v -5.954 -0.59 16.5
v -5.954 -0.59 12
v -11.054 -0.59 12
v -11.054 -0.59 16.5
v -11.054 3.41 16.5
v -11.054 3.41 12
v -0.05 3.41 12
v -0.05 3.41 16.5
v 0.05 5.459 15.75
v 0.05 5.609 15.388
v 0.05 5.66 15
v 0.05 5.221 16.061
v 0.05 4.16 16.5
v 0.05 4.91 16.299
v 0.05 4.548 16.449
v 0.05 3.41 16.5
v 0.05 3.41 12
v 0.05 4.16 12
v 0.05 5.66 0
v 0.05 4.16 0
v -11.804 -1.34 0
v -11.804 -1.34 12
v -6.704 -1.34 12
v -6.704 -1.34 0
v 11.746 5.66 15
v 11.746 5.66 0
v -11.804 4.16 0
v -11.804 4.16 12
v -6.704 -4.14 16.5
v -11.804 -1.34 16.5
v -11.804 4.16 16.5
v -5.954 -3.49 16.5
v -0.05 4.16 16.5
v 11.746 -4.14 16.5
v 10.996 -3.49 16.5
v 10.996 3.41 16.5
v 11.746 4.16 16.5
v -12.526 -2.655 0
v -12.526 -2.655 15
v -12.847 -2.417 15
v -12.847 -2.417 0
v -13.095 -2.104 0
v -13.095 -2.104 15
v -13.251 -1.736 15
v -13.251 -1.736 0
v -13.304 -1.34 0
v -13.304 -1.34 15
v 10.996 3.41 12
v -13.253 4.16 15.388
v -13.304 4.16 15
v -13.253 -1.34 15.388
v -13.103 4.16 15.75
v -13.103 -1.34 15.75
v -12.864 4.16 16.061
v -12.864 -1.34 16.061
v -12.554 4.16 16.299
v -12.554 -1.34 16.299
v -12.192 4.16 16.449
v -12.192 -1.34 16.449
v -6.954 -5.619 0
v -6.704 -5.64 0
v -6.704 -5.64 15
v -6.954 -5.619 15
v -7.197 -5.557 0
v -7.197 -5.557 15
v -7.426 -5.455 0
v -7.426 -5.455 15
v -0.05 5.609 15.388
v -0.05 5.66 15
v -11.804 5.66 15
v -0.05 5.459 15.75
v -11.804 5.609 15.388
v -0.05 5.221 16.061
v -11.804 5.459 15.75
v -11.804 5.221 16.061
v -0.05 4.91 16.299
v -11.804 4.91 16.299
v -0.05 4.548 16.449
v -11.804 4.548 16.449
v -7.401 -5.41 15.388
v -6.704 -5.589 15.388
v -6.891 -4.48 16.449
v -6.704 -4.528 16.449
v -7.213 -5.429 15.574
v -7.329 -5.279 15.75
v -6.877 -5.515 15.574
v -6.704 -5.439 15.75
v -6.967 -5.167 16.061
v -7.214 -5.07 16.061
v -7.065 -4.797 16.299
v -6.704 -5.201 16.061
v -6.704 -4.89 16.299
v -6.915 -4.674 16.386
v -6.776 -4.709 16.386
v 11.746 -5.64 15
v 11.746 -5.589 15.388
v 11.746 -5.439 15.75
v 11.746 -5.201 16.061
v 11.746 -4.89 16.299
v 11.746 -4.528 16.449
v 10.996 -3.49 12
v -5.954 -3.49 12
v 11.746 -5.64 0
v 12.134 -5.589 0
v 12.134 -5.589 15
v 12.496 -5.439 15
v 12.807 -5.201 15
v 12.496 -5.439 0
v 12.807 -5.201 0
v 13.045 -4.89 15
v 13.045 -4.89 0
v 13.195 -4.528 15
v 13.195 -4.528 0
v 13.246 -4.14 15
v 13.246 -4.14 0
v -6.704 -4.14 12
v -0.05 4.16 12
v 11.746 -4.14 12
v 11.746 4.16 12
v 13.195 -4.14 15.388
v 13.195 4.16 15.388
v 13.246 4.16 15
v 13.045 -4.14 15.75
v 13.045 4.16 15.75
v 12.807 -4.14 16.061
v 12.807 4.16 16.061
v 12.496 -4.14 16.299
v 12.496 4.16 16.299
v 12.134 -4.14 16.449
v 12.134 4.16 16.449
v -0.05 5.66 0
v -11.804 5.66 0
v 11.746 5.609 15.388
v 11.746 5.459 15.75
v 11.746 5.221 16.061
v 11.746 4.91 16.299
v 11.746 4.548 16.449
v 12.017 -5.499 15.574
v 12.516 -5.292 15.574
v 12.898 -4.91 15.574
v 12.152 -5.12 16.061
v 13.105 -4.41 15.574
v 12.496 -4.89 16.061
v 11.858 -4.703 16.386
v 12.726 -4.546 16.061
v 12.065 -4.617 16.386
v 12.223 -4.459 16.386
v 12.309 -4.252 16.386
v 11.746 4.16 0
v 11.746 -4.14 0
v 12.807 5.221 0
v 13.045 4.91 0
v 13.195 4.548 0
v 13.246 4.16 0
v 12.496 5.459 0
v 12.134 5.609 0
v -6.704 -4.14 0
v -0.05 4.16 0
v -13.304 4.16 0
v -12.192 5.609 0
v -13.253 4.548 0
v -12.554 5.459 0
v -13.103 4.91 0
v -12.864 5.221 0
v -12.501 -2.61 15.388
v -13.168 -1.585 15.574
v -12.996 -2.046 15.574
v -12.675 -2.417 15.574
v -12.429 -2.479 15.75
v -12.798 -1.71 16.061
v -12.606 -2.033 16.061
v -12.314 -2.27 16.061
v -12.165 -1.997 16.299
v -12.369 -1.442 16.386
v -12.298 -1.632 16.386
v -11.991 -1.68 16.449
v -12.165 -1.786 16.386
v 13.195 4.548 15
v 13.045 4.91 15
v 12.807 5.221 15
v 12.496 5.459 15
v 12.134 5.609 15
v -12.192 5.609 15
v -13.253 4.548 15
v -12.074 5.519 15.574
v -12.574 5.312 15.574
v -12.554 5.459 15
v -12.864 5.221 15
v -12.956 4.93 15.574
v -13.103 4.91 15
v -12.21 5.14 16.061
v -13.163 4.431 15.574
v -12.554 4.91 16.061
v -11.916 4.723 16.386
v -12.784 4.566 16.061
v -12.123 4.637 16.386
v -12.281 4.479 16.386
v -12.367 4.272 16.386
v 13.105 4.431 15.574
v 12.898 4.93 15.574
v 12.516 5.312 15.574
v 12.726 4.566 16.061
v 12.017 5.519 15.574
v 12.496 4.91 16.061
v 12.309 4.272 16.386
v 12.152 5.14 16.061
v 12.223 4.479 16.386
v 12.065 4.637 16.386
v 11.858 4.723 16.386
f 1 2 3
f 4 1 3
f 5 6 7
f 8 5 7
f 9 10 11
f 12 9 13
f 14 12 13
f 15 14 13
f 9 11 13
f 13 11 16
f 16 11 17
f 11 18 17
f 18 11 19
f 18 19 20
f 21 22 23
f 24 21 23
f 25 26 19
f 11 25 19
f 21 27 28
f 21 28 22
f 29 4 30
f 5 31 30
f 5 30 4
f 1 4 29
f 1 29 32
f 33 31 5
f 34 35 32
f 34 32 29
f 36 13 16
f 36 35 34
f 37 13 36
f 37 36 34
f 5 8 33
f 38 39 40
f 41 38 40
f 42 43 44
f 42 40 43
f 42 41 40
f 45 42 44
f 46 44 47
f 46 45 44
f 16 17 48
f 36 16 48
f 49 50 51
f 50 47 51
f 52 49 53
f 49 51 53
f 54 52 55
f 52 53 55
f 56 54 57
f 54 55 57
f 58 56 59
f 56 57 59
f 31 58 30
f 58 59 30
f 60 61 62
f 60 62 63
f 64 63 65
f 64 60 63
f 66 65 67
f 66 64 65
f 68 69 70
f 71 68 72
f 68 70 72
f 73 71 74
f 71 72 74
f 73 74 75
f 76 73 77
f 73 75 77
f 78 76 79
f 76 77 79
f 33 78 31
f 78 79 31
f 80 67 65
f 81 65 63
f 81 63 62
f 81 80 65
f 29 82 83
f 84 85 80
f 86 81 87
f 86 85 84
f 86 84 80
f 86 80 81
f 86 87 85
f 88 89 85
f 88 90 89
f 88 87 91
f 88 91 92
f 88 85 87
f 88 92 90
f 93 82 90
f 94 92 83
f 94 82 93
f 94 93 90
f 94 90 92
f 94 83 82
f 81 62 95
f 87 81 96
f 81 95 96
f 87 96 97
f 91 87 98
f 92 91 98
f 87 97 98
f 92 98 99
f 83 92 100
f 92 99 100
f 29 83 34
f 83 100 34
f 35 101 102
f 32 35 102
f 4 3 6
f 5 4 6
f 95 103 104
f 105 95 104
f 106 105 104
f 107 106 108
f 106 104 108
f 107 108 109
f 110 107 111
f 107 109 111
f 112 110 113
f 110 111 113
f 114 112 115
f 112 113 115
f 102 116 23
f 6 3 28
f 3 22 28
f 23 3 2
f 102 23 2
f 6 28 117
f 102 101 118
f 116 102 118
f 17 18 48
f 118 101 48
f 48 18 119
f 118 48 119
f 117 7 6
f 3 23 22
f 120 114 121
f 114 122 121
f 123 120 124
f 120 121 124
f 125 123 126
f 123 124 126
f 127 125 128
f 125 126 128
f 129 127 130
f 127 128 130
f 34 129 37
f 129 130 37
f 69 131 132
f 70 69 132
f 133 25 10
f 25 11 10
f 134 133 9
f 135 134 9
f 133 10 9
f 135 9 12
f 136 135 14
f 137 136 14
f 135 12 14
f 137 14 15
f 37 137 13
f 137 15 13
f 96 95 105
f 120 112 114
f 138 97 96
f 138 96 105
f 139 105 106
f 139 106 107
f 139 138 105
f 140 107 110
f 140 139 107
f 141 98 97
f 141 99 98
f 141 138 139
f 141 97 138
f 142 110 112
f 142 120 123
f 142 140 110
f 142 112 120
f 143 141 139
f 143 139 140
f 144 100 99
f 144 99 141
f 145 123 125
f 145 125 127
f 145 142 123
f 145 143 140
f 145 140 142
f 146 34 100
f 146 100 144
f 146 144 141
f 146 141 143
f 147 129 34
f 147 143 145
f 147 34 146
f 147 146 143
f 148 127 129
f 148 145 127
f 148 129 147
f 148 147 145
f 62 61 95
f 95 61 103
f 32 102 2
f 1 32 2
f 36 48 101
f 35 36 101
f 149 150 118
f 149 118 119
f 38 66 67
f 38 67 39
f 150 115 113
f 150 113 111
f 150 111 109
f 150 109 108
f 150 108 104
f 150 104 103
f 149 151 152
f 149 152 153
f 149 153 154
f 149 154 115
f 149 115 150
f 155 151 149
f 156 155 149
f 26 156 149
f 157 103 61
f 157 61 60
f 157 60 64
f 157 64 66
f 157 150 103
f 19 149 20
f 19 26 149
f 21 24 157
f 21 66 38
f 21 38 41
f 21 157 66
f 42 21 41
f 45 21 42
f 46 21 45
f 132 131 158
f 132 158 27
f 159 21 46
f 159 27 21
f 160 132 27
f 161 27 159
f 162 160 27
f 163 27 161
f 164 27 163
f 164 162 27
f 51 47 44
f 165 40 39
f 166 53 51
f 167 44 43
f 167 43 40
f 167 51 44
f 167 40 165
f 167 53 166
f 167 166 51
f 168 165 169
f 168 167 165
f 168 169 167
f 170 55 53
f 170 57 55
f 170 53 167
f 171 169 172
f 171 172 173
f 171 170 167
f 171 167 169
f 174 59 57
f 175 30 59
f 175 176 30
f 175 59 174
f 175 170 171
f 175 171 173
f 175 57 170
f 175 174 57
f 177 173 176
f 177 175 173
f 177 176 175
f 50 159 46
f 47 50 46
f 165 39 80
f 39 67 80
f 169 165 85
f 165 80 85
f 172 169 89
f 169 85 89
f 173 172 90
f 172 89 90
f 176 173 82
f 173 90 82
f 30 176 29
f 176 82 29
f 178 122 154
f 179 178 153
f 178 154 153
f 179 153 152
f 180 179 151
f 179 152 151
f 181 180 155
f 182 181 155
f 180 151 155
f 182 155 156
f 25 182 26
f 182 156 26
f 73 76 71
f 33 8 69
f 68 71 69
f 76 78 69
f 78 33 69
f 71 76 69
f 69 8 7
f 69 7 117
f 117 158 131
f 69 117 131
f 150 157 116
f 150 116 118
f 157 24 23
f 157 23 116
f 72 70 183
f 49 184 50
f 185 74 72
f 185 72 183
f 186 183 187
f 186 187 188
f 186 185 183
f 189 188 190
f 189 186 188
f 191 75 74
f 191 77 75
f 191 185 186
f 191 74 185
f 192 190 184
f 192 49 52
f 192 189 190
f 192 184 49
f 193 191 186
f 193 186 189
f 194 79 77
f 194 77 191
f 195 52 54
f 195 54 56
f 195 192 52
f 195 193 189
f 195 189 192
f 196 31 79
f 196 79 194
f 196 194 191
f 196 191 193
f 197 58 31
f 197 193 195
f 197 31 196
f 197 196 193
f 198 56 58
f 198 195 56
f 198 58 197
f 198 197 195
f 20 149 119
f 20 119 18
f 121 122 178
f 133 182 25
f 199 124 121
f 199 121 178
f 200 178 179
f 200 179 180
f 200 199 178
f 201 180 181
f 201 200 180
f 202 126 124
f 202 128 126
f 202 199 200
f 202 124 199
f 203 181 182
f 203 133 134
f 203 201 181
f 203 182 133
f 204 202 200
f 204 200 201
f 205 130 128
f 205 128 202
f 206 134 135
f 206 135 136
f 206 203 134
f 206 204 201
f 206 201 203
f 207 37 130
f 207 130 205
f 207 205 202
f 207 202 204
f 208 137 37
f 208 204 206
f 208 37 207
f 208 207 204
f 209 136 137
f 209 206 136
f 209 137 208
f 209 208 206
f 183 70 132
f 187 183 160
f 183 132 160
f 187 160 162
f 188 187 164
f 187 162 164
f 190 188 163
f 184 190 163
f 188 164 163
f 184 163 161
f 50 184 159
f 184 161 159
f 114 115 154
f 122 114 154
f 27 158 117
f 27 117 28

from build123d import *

# Parameters (mm, degrees)
SALIENTE_EXTRUIR1_DEPTH = 12
SALIENTE_EXTRUIR2_DEPTH = 4.5
CORTAR_EXTRUIR1_DEPTH   = 17
REDONDEO1_R             = 1.5


with BuildPart() as part:
    # Croquis1 → Saliente-Extruir1 (new body)
    with BuildSketch(Plane.XY):
        with BuildLine():
            Line((-6.703786212, -4.139854541), (11.746213788, -4.139854541))
            Line((11.746213788, -4.139854541), (11.746213788, 4.160145459))
            Line((11.746213788, 4.160145459), (0.05, 4.160145459))
            Line((0.05, 4.160145459), (0.05, 5.660145459))
            Line((0.05, 5.660145459), (11.746213788, 5.660145459))
            ThreePointArc((11.746213788, 5.660145459), (12.806873959, 5.220805631), (13.246213788, 4.160145459))
            Line((13.246213788, 4.160145459), (13.246213788, -4.139854541))
            ThreePointArc((13.246213788, -4.139854541), (12.806873959, -5.200514713), (11.746213788, -5.639854541))
            Line((11.746213788, -5.639854541), (-11.803786212, -5.639854541))
            ThreePointArc((-11.803786212, -5.639854541), (-12.864446384, -5.200514713), (-13.303786212, -4.139854541))
            Line((-13.303786212, -4.139854541), (-13.303786212, 4.160145459))
            ThreePointArc((-13.303786212, 4.160145459), (-12.864446384, 5.220805631), (-11.803786212, 5.660145459))
            Line((-11.803786212, 5.660145459), (-0.05, 5.660145459))
            Line((-0.05, 5.660145459), (-0.05, 4.160145459))
            Line((-0.05, 4.160145459), (-11.803786212, 4.160145459))
            Line((-11.803786212, 4.160145459), (-11.803786212, -1.339854541))
            Line((-11.803786212, -1.339854541), (-6.703786212, -1.339854541))
            Line((-6.703786212, -1.339854541), (-6.703786212, -4.139854541))
        make_face()
    extrude(amount=SALIENTE_EXTRUIR1_DEPTH)

    # Croquis2 → Saliente-Extruir2 (add)
    with BuildSketch(Plane.XY.offset(12)):
        with BuildLine():
            Line((-11.803786212, -5.639854541), (11.746213788, -5.639854541))
            ThreePointArc((11.746213788, -5.639854541), (12.806873959, -5.200514713), (13.246213788, -4.139854541))
            Line((13.246213788, -4.139854541), (13.246213788, 4.160145459))
            ThreePointArc((13.246213788, 4.160145459), (12.806873959, 5.220805631), (11.746213788, 5.660145459))
            Line((11.746213788, 5.660145459), (0.05, 5.660145459))
            Line((0.05, 5.660145459), (0.05, 3.410145459))
            Line((0.05, 3.410145459), (10.996213788, 3.410145459))
            Line((10.996213788, 3.410145459), (10.996213788, -3.489854541))
            Line((10.996213788, -3.489854541), (-5.953786212, -3.489854541))
            Line((-5.953786212, -3.489854541), (-5.953786212, -0.589854541))
            Line((-5.953786212, -0.589854541), (-11.053786212, -0.589854541))
            Line((-11.053786212, -0.589854541), (-11.053786212, 3.410145459))
            Line((-11.053786212, 3.410145459), (-10.745057731, 3.410145459))
            Line((-10.745057731, 3.410145459), (-0.05, 3.410145459))
            Line((-0.05, 3.410145459), (-0.05, 5.660145459))
            Line((-0.05, 5.660145459), (-11.803786212, 5.660145459))
            ThreePointArc((-11.803786212, 5.660145459), (-12.864446384, 5.220805631), (-13.303786212, 4.160145459))
            Line((-13.303786212, 4.160145459), (-13.303786212, -4.139854541))
            ThreePointArc((-13.303786212, -4.139854541), (-12.864446384, -5.200514713), (-11.803786212, -5.639854541))
        make_face()
    extrude(amount=SALIENTE_EXTRUIR2_DEPTH)

    # Croquis3 → Cortar-Extruir1 (cut)
    with BuildSketch(Plane(origin=(0, 0, 0), x_dir=(-1, 0, 0), z_dir=(0, 0, -1))):
        with BuildLine():
            Line((7.425674431, -5.454722367), (12.525674431, -2.654722367))
            ThreePointArc((12.525674431, -2.654722367), (13.094683638, -2.103781132), (13.303786212, -1.339854541))
            Line((13.303786212, -1.339854541), (14.985773561, -1.339854541))
            Line((14.985773561, -1.339854541), (14.985773561, -7.3319768))
            Line((14.985773561, -7.3319768), (6.703786212, -7.3319768))
            Line((6.703786212, -7.3319768), (6.703786212, -5.639854541))
            ThreePointArc((6.703786212, -5.639854541), (7.076410863, -5.592834537), (7.425674431, -5.454722367))
        make_face()
    extrude(amount=-CORTAR_EXTRUIR1_DEPTH, mode=Mode.SUBTRACT)

    # Redondeo1
    redondeo1_edges = [part.edges().sort_by_distance(p)[0] for p in [
        (12.806873959, -5.200514713, 16.5),
        (13.246213788, 0.010145459, 16.5),
        (12.806873959, 5.220805631, 16.5),
        (5.898106894, 5.660145459, 16.5),
        (-5.926893106, 5.660145459, 16.5),
        (-12.864446384, 5.220805631, 16.5),
        (-13.303786212, 1.410145459, 16.5),
        (2.521213788, -5.639854541, 16.5),
        (-13.094683638, -2.103781132, 16.5),
        (-9.975674431, -4.054722367, 16.5),
        (-7.076410863, -5.592834537, 16.5),
    ]]
    fillet(redondeo1_edges, radius=REDONDEO1_R)


solid = part.part
